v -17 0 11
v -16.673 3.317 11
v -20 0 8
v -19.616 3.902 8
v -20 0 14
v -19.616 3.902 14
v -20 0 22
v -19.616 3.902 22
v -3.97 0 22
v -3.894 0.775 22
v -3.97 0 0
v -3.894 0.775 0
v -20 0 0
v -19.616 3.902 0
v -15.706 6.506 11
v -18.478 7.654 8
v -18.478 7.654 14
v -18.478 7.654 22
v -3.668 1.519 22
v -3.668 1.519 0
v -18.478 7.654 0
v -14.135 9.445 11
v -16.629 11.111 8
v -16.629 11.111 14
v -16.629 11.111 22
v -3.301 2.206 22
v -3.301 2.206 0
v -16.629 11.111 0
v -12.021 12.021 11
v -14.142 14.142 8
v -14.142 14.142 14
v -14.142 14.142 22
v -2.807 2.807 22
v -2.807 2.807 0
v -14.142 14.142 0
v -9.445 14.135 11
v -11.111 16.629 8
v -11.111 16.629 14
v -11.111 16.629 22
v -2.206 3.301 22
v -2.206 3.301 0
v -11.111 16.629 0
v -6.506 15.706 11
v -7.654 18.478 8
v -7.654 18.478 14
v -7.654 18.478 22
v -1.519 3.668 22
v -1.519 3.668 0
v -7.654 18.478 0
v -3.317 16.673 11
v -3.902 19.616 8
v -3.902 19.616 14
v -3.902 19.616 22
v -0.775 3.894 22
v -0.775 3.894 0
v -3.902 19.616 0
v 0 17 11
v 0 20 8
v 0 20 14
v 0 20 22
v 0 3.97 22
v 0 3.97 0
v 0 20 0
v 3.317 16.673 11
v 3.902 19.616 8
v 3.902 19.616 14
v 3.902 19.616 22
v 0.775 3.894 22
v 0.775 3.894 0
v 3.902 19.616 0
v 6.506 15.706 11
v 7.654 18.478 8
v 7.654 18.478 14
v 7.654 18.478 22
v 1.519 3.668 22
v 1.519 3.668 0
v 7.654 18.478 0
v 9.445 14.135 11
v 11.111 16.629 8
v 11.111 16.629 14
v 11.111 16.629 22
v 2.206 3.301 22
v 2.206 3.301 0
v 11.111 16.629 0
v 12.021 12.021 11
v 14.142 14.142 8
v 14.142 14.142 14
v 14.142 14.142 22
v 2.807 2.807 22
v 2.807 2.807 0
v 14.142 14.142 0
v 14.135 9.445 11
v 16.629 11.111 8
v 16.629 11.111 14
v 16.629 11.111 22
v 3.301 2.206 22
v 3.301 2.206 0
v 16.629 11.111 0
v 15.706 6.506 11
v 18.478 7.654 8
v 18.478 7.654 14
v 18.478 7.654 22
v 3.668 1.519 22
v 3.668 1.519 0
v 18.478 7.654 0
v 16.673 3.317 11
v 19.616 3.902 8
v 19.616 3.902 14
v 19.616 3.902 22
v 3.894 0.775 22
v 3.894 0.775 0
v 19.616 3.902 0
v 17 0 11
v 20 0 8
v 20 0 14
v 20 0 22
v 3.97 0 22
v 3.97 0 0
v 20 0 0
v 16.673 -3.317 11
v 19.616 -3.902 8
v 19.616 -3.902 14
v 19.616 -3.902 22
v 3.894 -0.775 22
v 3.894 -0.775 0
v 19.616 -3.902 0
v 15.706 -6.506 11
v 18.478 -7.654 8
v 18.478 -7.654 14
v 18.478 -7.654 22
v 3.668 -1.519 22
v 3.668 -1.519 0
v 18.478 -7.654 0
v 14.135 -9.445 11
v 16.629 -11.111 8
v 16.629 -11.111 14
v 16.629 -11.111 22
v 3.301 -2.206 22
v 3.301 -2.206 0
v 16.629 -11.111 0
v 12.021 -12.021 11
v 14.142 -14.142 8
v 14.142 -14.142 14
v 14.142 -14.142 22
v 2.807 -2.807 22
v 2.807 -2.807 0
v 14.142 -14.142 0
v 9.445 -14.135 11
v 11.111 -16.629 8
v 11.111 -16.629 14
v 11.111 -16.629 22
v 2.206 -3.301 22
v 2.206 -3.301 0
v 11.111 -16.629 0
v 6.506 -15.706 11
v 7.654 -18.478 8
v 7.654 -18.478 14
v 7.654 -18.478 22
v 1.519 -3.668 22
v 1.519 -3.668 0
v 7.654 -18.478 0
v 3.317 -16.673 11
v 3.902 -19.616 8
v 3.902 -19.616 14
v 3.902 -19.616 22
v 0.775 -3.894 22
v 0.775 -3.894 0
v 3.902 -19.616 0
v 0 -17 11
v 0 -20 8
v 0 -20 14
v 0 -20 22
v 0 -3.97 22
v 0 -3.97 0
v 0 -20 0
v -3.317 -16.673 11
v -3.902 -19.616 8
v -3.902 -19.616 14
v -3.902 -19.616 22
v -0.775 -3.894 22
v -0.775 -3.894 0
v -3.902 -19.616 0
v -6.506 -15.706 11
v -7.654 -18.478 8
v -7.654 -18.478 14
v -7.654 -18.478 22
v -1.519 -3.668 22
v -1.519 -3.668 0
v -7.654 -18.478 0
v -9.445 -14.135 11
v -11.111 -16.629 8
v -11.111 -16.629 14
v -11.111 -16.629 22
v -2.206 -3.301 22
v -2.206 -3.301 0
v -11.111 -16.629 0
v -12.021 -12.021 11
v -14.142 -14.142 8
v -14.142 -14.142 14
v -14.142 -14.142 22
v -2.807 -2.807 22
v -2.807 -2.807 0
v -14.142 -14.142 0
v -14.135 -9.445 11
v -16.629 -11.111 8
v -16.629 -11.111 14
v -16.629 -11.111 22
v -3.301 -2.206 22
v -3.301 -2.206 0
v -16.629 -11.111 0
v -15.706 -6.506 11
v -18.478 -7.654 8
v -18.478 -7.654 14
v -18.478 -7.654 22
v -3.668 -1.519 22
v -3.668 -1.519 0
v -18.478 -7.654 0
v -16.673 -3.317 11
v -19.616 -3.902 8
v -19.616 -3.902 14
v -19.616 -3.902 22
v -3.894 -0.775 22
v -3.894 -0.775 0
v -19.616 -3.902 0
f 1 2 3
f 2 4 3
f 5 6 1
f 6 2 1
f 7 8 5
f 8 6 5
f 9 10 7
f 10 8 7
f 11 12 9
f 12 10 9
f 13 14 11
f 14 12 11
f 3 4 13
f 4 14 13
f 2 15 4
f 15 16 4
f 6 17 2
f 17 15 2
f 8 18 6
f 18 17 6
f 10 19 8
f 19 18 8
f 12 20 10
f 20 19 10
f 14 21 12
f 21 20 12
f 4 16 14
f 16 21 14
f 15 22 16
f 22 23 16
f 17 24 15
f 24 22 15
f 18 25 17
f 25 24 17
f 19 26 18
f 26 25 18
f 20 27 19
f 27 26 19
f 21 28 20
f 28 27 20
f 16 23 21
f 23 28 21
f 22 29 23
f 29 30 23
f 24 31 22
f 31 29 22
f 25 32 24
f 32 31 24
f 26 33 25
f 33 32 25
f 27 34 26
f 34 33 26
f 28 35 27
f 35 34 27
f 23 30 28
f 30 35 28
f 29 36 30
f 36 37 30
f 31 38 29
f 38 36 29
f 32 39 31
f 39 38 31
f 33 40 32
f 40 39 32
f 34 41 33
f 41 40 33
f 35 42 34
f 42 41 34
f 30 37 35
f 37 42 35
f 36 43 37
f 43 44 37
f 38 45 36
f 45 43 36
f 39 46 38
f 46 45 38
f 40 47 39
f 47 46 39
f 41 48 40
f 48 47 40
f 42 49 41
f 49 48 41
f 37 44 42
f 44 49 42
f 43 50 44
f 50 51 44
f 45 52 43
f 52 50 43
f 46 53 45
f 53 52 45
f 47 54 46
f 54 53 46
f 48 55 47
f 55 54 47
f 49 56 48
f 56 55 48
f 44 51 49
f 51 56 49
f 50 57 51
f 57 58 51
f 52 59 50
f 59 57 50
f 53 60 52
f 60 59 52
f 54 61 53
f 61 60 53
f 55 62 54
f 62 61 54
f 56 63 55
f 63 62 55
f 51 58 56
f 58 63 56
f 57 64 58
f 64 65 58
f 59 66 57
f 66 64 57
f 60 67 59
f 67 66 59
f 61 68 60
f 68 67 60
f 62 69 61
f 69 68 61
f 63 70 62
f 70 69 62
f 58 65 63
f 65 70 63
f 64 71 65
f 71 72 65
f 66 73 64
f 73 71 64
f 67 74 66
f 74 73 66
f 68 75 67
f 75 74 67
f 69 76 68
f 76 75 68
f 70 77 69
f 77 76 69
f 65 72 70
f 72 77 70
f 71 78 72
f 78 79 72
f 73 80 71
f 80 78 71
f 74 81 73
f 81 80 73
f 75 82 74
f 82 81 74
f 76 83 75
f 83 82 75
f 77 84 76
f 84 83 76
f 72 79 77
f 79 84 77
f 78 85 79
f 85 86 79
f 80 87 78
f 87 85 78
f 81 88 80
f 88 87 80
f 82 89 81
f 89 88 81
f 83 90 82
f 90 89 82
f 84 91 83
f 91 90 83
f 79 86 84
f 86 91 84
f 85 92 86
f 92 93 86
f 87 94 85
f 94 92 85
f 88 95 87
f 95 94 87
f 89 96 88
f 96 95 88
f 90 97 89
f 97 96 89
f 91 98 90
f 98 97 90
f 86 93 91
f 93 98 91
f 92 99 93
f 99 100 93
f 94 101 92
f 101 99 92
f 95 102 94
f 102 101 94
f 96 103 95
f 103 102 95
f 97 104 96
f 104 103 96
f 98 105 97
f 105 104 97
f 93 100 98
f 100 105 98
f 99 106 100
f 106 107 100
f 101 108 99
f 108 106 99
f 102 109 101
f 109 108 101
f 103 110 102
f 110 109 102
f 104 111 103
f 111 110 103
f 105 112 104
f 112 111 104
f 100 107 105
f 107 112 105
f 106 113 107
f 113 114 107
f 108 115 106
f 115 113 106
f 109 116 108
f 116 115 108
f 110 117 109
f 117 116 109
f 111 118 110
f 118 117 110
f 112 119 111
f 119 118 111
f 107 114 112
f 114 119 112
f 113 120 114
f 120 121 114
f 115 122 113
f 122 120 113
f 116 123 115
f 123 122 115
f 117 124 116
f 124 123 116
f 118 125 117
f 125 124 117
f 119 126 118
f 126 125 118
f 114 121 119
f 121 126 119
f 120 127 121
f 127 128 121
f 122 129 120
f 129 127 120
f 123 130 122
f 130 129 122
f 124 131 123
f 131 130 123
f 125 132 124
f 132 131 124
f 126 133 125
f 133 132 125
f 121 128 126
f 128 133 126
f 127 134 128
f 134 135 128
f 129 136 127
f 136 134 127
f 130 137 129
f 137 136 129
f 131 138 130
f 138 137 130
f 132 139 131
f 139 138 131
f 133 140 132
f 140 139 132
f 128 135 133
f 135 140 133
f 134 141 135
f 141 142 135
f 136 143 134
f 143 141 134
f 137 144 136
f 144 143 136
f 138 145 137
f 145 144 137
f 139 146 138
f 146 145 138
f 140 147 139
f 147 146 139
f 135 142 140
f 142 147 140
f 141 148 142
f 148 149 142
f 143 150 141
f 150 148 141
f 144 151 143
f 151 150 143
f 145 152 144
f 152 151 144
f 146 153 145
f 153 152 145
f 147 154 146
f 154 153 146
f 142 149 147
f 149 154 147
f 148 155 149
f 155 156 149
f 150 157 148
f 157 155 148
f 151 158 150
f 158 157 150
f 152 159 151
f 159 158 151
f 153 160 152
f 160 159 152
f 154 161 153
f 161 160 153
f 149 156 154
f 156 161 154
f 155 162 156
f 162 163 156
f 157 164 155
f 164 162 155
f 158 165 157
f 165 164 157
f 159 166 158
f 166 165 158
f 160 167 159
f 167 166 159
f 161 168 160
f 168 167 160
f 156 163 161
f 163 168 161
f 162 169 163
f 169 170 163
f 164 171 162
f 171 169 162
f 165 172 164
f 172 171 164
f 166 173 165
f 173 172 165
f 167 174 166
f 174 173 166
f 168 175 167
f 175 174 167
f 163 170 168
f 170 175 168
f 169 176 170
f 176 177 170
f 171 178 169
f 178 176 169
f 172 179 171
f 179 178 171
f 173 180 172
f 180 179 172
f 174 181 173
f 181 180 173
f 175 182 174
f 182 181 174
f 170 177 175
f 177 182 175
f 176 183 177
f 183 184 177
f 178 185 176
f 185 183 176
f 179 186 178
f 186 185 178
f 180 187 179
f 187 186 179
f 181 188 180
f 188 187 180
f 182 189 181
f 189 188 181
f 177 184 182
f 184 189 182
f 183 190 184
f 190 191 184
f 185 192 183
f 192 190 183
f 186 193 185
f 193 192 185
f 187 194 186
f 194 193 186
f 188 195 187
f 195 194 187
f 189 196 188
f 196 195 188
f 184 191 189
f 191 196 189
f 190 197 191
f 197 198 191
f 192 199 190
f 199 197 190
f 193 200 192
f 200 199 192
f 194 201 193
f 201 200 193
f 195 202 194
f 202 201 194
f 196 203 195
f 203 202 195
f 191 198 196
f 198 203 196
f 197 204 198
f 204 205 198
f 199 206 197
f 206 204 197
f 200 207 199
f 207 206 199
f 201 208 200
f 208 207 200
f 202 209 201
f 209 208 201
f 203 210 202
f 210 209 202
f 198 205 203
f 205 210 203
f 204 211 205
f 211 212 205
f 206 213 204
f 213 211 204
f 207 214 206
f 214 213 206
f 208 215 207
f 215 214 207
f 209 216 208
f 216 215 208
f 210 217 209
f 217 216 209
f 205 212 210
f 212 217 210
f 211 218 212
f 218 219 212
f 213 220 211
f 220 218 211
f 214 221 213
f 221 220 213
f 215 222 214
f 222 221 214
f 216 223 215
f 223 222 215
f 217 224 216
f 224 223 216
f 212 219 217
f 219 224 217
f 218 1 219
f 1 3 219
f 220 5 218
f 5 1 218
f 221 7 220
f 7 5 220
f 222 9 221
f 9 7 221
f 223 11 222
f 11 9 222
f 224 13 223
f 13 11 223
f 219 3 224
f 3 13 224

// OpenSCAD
$fn = 32;

// ----------------------------------------------------------------------
// Belt roller: 40 mm barrel, 22 mm wide, bore 7.94 mm
// ----------------------------------------------------------------------

// --- parameters (mm) ---
bore_d = 7.94;            // bore
barrel_d = 40;            // barrel diameter
roller_w = 22;            // roller width
groove_w = 6;             // guide groove width
groove_d = 3;             // guide groove depth

roller_profile = [[3.97, 0], [20, 0], [20, 8], [17, 11], [20, 14], [20, 22], [3.97, 22]];

/* the profile stays clear of the axis, so the bore comes out of the revolve */
rotate_extrude() polygon(roller_profile);
